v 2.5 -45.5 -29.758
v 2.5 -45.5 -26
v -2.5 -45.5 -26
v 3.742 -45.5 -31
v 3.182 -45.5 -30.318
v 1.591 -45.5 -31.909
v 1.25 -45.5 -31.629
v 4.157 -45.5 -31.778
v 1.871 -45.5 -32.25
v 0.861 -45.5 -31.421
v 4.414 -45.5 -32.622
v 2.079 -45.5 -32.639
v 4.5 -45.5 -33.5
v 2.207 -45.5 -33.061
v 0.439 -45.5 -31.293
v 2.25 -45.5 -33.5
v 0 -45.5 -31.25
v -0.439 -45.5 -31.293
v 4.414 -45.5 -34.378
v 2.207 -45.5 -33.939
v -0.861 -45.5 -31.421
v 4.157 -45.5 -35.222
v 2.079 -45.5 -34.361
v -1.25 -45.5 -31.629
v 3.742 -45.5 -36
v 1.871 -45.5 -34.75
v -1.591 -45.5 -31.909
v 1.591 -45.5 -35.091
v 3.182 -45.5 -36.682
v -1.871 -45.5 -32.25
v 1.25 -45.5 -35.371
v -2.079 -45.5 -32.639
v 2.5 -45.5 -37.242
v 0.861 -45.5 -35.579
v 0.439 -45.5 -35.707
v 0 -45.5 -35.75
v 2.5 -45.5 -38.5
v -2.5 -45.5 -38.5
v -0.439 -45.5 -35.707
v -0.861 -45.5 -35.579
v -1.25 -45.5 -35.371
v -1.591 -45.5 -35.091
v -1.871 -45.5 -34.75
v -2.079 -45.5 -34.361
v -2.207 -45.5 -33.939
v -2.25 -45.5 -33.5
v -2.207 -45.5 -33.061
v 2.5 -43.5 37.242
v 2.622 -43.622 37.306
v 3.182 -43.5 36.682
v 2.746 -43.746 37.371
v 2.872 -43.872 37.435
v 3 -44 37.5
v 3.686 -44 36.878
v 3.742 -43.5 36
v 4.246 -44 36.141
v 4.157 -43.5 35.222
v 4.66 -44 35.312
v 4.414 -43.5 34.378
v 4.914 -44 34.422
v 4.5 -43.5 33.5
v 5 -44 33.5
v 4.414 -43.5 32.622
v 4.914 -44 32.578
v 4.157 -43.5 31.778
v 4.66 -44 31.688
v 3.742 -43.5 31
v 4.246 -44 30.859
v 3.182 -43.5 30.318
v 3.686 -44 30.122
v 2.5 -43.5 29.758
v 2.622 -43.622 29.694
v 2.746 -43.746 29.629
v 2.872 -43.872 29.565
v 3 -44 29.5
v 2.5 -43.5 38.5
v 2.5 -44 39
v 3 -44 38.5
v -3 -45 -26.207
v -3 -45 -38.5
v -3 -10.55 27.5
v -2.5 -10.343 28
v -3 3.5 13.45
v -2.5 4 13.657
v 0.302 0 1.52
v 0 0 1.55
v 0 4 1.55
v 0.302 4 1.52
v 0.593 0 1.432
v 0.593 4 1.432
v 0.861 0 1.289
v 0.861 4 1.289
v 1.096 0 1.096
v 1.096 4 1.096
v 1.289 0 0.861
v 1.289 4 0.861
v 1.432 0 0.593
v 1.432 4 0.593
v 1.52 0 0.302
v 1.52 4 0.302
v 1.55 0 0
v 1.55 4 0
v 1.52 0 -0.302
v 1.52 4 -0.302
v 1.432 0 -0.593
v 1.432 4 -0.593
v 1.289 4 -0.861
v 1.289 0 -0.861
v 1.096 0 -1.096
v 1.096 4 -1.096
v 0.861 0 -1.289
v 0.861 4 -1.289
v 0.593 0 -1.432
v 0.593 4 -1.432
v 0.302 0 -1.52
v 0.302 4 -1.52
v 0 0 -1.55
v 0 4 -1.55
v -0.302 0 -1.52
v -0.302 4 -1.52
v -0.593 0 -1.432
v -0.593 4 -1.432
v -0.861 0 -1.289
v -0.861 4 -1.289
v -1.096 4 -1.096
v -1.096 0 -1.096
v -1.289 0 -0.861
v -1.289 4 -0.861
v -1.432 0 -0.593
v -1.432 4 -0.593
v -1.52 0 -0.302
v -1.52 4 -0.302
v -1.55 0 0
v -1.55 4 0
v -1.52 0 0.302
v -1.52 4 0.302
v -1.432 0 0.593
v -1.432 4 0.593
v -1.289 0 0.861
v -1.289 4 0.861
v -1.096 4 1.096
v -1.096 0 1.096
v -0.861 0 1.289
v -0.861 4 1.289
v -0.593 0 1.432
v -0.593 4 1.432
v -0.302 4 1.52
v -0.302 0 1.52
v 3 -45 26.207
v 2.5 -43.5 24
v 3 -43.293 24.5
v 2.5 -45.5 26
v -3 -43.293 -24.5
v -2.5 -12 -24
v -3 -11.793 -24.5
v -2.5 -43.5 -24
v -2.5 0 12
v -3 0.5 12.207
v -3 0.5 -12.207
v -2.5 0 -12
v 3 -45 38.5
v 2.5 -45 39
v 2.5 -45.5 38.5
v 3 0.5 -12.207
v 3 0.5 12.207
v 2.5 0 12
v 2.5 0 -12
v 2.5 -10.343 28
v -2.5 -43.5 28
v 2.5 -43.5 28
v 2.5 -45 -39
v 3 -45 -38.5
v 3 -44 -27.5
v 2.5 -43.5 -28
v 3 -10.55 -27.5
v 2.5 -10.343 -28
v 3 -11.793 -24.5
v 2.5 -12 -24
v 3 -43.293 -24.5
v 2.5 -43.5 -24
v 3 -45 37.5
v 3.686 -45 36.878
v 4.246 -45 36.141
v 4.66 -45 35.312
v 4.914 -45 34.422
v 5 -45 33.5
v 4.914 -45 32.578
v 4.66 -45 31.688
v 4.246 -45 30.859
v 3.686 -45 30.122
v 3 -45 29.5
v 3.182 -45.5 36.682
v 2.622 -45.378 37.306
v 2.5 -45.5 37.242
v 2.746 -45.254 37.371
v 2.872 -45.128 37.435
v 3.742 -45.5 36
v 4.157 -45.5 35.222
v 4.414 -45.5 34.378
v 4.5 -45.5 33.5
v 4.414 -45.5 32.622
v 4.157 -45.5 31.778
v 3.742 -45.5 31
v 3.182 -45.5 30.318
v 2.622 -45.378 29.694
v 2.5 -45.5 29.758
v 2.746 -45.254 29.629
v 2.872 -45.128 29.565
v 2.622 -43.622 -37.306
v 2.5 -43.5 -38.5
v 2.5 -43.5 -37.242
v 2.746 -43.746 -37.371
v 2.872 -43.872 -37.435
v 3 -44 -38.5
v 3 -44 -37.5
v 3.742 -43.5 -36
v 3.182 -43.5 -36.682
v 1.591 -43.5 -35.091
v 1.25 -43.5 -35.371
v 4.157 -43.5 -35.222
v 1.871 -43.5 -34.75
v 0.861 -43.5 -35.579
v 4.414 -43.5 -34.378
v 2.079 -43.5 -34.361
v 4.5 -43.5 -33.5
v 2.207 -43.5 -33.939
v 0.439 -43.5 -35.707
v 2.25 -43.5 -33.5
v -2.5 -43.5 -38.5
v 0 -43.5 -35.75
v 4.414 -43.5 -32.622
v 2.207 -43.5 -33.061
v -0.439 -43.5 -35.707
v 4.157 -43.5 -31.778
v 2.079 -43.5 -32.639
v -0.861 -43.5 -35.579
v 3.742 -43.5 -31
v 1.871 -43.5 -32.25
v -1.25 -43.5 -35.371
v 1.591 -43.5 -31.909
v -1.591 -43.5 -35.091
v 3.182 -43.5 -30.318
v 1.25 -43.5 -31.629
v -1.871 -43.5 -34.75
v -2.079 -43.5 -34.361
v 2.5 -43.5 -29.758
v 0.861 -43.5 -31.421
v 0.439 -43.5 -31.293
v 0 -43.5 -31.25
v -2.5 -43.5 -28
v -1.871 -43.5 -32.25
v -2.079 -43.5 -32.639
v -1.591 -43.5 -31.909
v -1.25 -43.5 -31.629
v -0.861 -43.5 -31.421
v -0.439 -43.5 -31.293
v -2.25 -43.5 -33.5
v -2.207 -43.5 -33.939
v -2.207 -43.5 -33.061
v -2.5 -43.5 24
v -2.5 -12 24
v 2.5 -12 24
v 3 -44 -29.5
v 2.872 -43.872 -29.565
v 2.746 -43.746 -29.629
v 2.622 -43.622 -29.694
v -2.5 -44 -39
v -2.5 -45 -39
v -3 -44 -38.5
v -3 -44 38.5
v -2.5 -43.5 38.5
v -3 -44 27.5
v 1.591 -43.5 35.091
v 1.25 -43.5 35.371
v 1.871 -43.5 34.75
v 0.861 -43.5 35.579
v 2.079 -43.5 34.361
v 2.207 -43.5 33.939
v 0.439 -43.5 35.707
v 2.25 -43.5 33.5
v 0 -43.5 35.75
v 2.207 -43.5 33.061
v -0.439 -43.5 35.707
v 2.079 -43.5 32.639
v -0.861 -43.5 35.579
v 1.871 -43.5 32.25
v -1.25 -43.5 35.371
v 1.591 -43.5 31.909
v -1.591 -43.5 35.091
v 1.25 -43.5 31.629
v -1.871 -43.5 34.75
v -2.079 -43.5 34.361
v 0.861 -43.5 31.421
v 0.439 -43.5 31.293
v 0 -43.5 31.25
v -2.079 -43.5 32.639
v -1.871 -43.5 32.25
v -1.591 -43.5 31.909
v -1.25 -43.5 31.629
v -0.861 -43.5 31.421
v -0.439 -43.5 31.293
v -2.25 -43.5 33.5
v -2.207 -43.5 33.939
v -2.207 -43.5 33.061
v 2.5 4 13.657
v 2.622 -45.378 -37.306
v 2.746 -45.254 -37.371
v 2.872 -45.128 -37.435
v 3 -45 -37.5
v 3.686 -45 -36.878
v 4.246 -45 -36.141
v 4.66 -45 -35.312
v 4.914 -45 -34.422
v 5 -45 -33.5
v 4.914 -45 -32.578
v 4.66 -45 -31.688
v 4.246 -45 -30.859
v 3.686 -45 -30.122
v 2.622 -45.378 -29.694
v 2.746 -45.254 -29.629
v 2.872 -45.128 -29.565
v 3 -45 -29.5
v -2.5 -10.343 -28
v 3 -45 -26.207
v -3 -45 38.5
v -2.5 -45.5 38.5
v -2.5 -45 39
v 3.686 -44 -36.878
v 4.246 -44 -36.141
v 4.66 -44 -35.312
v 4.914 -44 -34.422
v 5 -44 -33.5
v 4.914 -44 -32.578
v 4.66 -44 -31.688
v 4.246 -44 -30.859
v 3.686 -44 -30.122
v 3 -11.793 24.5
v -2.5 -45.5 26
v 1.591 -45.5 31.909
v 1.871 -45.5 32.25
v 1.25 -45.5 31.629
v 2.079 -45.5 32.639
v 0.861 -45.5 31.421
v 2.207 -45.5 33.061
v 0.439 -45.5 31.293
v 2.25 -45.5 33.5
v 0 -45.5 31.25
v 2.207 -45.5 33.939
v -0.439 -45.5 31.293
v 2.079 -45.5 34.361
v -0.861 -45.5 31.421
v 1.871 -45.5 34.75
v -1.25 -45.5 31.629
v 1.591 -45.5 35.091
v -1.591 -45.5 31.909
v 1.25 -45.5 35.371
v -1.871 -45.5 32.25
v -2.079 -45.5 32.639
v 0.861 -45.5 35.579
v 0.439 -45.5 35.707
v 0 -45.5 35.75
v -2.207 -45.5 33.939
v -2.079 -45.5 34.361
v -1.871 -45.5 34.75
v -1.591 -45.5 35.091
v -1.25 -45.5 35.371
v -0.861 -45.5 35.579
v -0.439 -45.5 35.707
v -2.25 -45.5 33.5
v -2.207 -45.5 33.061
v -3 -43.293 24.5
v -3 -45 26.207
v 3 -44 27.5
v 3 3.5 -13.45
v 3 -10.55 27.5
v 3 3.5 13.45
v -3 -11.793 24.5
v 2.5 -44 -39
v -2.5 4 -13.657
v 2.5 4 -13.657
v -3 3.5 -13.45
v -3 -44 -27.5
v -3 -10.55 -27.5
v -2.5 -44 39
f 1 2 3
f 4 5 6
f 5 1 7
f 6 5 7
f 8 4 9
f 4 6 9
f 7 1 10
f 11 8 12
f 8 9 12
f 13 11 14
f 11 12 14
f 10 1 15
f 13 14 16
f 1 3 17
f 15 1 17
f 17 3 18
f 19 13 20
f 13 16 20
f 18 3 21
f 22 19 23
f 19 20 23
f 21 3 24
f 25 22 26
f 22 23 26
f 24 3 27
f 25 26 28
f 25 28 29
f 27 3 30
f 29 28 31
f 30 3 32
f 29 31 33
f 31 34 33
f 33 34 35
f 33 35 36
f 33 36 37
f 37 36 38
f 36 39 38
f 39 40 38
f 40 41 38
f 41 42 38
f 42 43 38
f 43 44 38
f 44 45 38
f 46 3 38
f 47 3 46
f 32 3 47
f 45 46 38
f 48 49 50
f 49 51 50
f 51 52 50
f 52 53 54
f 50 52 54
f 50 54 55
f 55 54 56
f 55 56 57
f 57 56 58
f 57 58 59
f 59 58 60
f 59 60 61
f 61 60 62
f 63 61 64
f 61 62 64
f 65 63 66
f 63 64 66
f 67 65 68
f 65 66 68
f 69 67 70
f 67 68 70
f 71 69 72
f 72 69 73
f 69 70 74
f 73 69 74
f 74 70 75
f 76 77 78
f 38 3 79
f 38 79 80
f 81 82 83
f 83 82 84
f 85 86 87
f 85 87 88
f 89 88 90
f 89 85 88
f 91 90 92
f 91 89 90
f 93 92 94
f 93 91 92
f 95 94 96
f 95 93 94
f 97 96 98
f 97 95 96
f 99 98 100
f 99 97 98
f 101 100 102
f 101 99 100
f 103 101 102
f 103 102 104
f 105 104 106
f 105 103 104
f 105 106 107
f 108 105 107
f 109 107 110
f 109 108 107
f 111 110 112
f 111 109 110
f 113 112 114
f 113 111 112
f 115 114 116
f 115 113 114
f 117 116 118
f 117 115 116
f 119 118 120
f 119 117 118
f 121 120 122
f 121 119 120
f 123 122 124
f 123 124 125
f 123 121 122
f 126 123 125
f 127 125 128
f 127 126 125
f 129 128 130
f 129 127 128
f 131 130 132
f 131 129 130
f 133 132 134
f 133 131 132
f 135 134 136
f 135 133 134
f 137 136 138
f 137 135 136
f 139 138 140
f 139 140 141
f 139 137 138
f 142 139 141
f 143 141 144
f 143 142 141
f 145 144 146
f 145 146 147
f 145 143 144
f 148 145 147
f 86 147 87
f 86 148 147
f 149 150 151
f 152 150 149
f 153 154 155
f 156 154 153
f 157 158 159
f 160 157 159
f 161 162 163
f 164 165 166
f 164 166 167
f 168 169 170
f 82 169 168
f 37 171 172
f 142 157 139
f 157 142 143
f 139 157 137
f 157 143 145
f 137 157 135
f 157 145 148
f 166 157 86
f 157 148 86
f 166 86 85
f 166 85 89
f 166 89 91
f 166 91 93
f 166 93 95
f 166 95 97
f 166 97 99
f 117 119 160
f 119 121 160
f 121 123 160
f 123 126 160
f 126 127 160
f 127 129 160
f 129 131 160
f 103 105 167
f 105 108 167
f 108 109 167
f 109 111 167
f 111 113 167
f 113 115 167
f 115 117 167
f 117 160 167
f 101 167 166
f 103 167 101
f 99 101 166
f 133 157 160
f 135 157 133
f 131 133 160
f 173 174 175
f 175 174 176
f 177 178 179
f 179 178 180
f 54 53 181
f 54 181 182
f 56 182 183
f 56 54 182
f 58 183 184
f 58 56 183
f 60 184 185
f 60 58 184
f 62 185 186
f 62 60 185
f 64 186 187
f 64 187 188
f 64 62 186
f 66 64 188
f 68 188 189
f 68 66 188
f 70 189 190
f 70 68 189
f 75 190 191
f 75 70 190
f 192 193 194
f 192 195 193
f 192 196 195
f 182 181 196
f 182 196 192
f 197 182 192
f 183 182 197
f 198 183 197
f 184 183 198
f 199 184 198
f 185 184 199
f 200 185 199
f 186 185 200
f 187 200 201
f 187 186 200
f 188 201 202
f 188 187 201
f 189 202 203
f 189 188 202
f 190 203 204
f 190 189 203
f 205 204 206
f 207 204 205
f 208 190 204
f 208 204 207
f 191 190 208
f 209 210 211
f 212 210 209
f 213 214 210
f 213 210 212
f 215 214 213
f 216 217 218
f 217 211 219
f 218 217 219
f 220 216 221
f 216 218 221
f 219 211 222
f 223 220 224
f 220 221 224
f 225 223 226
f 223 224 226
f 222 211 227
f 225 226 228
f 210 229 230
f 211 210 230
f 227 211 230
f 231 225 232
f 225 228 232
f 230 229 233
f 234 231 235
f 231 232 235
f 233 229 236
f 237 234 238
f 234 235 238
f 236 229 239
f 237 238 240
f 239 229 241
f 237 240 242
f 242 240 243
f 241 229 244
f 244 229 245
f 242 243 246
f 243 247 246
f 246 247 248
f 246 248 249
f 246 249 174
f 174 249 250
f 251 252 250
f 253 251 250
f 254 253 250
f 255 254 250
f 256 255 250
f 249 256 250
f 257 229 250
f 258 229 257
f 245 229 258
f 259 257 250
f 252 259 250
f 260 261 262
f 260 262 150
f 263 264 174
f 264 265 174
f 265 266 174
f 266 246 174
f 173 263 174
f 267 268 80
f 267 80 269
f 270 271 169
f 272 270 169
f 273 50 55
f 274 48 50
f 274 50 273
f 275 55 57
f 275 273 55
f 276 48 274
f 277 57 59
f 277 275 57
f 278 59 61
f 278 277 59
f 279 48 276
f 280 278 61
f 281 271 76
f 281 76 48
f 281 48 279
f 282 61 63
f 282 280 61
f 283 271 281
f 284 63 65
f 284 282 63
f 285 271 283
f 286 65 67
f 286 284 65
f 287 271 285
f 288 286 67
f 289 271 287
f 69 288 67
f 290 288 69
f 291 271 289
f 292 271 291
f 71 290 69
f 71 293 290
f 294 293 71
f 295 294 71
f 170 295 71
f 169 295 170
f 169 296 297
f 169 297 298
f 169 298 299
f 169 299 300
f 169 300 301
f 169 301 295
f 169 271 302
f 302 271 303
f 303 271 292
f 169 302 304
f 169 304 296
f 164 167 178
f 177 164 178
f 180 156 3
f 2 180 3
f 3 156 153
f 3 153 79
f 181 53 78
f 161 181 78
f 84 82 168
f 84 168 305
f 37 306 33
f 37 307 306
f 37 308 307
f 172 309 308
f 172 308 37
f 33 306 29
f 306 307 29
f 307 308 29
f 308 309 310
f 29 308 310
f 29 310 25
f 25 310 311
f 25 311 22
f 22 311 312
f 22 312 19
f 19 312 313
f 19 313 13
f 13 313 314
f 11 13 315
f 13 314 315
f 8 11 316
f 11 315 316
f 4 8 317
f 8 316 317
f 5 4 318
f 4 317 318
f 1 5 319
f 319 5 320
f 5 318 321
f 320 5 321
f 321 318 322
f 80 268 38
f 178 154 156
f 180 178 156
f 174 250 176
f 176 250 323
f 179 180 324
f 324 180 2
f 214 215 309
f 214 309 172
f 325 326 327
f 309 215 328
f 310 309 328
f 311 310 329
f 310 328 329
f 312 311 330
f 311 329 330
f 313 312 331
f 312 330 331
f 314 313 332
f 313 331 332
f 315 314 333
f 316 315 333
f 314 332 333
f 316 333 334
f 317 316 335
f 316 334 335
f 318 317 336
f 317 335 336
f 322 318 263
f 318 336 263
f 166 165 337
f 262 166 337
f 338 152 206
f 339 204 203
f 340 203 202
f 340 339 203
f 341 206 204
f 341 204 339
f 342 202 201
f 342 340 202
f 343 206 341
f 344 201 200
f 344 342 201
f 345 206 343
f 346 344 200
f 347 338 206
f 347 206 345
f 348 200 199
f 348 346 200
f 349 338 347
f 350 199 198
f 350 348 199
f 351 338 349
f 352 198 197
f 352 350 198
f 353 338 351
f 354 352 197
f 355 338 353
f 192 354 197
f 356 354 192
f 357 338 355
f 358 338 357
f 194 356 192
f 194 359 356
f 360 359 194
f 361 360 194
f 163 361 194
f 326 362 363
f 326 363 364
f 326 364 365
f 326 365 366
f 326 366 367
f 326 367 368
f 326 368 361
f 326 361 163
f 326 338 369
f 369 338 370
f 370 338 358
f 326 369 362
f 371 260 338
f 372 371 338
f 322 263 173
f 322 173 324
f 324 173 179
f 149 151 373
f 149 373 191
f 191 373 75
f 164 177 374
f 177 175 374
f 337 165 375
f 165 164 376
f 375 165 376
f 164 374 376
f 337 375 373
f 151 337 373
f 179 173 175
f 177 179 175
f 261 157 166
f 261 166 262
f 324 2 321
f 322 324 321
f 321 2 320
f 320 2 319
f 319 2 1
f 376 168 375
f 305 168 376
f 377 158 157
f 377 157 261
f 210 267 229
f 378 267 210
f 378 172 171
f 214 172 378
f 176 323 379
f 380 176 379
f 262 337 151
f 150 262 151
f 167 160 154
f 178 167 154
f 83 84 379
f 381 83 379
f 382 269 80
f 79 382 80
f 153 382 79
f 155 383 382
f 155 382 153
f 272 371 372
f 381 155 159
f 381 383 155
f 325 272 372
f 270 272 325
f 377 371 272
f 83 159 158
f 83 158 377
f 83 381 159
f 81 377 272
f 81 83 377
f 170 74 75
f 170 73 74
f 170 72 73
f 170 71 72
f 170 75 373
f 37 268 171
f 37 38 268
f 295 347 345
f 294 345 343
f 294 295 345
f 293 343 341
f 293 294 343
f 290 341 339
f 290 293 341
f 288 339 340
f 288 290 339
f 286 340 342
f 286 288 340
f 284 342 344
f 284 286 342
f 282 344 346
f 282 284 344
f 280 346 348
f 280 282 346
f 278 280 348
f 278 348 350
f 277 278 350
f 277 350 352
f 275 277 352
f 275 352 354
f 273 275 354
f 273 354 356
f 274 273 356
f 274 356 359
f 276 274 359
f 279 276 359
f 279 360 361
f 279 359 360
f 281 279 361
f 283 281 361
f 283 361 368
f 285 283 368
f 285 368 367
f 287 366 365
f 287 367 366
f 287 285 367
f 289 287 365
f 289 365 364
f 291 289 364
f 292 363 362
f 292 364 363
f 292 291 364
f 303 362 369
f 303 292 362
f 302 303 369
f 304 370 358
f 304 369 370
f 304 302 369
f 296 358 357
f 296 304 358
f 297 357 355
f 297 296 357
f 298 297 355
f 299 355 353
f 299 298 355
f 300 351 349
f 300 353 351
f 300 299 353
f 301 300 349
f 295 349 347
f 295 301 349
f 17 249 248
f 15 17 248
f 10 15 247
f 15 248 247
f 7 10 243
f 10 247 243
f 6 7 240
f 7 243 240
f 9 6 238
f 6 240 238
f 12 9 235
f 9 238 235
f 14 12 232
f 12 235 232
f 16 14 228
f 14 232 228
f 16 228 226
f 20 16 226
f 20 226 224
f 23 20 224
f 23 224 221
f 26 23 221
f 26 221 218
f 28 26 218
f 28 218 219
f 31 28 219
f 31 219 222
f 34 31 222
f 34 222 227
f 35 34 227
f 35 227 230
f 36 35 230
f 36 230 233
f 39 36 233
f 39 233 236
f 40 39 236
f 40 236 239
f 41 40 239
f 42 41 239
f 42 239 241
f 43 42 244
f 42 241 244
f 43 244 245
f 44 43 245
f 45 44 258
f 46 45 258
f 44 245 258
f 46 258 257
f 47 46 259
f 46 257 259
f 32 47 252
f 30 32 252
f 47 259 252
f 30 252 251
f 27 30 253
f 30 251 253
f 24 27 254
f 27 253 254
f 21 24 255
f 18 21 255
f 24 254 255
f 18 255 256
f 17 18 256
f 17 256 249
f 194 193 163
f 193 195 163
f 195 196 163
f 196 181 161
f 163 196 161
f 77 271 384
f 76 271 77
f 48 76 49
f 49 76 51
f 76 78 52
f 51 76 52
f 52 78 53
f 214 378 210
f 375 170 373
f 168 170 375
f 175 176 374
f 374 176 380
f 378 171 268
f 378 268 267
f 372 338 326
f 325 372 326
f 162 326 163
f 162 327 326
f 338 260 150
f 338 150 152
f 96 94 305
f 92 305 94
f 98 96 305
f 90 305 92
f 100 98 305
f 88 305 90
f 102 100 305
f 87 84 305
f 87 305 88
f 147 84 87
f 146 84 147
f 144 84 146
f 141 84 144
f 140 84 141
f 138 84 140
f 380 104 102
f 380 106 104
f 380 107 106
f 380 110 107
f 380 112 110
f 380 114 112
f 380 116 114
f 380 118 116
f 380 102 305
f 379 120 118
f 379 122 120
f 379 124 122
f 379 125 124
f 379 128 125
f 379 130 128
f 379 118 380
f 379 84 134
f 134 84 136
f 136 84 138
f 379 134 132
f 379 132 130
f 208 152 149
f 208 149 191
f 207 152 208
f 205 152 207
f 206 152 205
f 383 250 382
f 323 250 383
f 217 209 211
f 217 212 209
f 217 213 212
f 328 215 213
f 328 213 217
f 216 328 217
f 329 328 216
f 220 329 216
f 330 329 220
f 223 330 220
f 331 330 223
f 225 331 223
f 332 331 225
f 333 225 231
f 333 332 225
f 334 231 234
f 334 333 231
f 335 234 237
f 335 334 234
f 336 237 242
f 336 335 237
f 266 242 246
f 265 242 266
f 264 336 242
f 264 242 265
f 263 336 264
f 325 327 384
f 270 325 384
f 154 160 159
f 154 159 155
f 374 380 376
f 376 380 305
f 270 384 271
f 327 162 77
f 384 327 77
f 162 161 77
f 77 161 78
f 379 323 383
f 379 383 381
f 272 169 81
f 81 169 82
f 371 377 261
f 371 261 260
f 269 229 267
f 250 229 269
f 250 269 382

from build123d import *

# Parameters (mm, degrees)
SKETCH1_W           = 6
SKETCH1_H           = 24
SKETCH1_R           = 1.55
BOSS_EXTRUDE1_DEPTH = 4
BOSS_EXTRUDE2_DEPTH = 6
SKETCH3_R           = 2.25
CUT_EXTRUDE1_DEPTH  = 62.532511732
BOSS_EXTRUDE3_DEPTH = 2
CHAMFER1_SIZE       = 0.5


with BuildPart() as part:
    # Sketch1 → Boss-Extrude1 (new body)
    with BuildSketch(Plane(origin=(0, 0, 0), x_dir=(1, 0, 0), z_dir=(0, 1, 0))):
        Rectangle(SKETCH1_W, SKETCH1_H)
        with Locations(Location((0, 0, 0), (0, 0, 270))):
            Circle(SKETCH1_R, mode=Mode.SUBTRACT)
    extrude(amount=BOSS_EXTRUDE1_DEPTH)

    # Sketch2 → Boss-Extrude2 (add)
    with BuildSketch(Plane.ZY.offset(3)):
        Polygon((-12, 0), (-24, -12), (-24, -43.5), (-26, -45.5), (-39, -45.5), (-39, -43.5), (-28, -43.5), (-28, -10.343145751), (-13.656854249, 4), (-12, 4), align=None)
    boss_extrude2 = extrude(amount=-BOSS_EXTRUDE2_DEPTH)

    # Sketch3 → Cut-Extrude1 (cut, through all)
    with BuildSketch(Plane(origin=(0, -43.5, 0), x_dir=(1, 0, 0), z_dir=(0, 1, 0))):
        with Locations(Location((0, 33.5, 0), (0, 0, 270))):
            Circle(SKETCH3_R)
    cut_extrude1 = extrude(amount=-CUT_EXTRUDE1_DEPTH, mode=Mode.SUBTRACT)

    # Sketch4 → Boss-Extrude3 (add)
    with BuildSketch(Plane(origin=(0, -43.5, 0), x_dir=(1, 0, 0), z_dir=(0, 1, 0))):
        with BuildLine():
            Line((3, 29.5), (3, 37.5))
            ThreePointArc((3, 37.5), (5, 33.5), (3, 29.5))
        make_face()
    boss_extrude3 = extrude(amount=-BOSS_EXTRUDE3_DEPTH)

    # Mirror1: Boss-Extrude2, Cut-Extrude1, Boss-Extrude3 across plane
    add(boss_extrude2.mirror(Plane.XY))
    add(cut_extrude1.mirror(Plane.XY), mode=Mode.SUBTRACT)
    add(boss_extrude3.mirror(Plane.XY))

    # Chamfer1
    chamfer1_edges = [part.edges().sort_by_distance(p)[0] for p in [
        (-3, 4, 0),
        (0, -45.5, -39),
        (0, -43.5, -39),
        (-3, -3.171572875, -20.828427125),
        (-3, -26.921572875, -28),
        (-3, -43.5, -33.5),
        (-3, -44.5, -39),
        (-3, -45.5, -32.5),
        (-3, -44.5, -25),
        (-3, -27.75, -24),
        (-3, -6, -18),
        (3, -6, -18),
        (3, -27.75, -24),
        (3, -44.5, -25),
        (3, -45.5, -27.75),
        (3, -44.5, -39),
        (3, -43.5, -38.25),
        (3, -26.921572875, -28),
        (3, -3.171572875, -20.828427125),
        (3, -43.5, -28.75),
        (3, -45.5, -38.25),
        (5, -43.5, -33.5),
        (5, -45.5, -33.5),
        (3, 4, 0),
        (-3, 0, 0),
        (3, -6, 18),
        (-3, -6, 18),
        (3, -27.75, 24),
        (-3, -27.75, 24),
        (3, -44.5, 25),
        (-3, -44.5, 25),
        (3, -45.5, 27.75),
        (0, -45.5, 39),
        (-3, -45.5, 32.5),
        (3, -44.5, 39),
        (0, -43.5, 39),
        (-3, -44.5, 39),
        (3, -43.5, 38.25),
        (-3, -43.5, 33.5),
        (3, -26.921572875, 28),
        (-3, -26.921572875, 28),
        (3, -3.171572875, 20.828427125),
        (-3, -3.171572875, 20.828427125),
        (3, 0, 0),
        (3, -43.5, 28.75),
        (3, -45.5, 38.25),
        (5, -43.5, 33.5),
        (5, -45.5, 33.5),
    ]]
    chamfer(chamfer1_edges, length=CHAMFER1_SIZE)


solid = part.part
